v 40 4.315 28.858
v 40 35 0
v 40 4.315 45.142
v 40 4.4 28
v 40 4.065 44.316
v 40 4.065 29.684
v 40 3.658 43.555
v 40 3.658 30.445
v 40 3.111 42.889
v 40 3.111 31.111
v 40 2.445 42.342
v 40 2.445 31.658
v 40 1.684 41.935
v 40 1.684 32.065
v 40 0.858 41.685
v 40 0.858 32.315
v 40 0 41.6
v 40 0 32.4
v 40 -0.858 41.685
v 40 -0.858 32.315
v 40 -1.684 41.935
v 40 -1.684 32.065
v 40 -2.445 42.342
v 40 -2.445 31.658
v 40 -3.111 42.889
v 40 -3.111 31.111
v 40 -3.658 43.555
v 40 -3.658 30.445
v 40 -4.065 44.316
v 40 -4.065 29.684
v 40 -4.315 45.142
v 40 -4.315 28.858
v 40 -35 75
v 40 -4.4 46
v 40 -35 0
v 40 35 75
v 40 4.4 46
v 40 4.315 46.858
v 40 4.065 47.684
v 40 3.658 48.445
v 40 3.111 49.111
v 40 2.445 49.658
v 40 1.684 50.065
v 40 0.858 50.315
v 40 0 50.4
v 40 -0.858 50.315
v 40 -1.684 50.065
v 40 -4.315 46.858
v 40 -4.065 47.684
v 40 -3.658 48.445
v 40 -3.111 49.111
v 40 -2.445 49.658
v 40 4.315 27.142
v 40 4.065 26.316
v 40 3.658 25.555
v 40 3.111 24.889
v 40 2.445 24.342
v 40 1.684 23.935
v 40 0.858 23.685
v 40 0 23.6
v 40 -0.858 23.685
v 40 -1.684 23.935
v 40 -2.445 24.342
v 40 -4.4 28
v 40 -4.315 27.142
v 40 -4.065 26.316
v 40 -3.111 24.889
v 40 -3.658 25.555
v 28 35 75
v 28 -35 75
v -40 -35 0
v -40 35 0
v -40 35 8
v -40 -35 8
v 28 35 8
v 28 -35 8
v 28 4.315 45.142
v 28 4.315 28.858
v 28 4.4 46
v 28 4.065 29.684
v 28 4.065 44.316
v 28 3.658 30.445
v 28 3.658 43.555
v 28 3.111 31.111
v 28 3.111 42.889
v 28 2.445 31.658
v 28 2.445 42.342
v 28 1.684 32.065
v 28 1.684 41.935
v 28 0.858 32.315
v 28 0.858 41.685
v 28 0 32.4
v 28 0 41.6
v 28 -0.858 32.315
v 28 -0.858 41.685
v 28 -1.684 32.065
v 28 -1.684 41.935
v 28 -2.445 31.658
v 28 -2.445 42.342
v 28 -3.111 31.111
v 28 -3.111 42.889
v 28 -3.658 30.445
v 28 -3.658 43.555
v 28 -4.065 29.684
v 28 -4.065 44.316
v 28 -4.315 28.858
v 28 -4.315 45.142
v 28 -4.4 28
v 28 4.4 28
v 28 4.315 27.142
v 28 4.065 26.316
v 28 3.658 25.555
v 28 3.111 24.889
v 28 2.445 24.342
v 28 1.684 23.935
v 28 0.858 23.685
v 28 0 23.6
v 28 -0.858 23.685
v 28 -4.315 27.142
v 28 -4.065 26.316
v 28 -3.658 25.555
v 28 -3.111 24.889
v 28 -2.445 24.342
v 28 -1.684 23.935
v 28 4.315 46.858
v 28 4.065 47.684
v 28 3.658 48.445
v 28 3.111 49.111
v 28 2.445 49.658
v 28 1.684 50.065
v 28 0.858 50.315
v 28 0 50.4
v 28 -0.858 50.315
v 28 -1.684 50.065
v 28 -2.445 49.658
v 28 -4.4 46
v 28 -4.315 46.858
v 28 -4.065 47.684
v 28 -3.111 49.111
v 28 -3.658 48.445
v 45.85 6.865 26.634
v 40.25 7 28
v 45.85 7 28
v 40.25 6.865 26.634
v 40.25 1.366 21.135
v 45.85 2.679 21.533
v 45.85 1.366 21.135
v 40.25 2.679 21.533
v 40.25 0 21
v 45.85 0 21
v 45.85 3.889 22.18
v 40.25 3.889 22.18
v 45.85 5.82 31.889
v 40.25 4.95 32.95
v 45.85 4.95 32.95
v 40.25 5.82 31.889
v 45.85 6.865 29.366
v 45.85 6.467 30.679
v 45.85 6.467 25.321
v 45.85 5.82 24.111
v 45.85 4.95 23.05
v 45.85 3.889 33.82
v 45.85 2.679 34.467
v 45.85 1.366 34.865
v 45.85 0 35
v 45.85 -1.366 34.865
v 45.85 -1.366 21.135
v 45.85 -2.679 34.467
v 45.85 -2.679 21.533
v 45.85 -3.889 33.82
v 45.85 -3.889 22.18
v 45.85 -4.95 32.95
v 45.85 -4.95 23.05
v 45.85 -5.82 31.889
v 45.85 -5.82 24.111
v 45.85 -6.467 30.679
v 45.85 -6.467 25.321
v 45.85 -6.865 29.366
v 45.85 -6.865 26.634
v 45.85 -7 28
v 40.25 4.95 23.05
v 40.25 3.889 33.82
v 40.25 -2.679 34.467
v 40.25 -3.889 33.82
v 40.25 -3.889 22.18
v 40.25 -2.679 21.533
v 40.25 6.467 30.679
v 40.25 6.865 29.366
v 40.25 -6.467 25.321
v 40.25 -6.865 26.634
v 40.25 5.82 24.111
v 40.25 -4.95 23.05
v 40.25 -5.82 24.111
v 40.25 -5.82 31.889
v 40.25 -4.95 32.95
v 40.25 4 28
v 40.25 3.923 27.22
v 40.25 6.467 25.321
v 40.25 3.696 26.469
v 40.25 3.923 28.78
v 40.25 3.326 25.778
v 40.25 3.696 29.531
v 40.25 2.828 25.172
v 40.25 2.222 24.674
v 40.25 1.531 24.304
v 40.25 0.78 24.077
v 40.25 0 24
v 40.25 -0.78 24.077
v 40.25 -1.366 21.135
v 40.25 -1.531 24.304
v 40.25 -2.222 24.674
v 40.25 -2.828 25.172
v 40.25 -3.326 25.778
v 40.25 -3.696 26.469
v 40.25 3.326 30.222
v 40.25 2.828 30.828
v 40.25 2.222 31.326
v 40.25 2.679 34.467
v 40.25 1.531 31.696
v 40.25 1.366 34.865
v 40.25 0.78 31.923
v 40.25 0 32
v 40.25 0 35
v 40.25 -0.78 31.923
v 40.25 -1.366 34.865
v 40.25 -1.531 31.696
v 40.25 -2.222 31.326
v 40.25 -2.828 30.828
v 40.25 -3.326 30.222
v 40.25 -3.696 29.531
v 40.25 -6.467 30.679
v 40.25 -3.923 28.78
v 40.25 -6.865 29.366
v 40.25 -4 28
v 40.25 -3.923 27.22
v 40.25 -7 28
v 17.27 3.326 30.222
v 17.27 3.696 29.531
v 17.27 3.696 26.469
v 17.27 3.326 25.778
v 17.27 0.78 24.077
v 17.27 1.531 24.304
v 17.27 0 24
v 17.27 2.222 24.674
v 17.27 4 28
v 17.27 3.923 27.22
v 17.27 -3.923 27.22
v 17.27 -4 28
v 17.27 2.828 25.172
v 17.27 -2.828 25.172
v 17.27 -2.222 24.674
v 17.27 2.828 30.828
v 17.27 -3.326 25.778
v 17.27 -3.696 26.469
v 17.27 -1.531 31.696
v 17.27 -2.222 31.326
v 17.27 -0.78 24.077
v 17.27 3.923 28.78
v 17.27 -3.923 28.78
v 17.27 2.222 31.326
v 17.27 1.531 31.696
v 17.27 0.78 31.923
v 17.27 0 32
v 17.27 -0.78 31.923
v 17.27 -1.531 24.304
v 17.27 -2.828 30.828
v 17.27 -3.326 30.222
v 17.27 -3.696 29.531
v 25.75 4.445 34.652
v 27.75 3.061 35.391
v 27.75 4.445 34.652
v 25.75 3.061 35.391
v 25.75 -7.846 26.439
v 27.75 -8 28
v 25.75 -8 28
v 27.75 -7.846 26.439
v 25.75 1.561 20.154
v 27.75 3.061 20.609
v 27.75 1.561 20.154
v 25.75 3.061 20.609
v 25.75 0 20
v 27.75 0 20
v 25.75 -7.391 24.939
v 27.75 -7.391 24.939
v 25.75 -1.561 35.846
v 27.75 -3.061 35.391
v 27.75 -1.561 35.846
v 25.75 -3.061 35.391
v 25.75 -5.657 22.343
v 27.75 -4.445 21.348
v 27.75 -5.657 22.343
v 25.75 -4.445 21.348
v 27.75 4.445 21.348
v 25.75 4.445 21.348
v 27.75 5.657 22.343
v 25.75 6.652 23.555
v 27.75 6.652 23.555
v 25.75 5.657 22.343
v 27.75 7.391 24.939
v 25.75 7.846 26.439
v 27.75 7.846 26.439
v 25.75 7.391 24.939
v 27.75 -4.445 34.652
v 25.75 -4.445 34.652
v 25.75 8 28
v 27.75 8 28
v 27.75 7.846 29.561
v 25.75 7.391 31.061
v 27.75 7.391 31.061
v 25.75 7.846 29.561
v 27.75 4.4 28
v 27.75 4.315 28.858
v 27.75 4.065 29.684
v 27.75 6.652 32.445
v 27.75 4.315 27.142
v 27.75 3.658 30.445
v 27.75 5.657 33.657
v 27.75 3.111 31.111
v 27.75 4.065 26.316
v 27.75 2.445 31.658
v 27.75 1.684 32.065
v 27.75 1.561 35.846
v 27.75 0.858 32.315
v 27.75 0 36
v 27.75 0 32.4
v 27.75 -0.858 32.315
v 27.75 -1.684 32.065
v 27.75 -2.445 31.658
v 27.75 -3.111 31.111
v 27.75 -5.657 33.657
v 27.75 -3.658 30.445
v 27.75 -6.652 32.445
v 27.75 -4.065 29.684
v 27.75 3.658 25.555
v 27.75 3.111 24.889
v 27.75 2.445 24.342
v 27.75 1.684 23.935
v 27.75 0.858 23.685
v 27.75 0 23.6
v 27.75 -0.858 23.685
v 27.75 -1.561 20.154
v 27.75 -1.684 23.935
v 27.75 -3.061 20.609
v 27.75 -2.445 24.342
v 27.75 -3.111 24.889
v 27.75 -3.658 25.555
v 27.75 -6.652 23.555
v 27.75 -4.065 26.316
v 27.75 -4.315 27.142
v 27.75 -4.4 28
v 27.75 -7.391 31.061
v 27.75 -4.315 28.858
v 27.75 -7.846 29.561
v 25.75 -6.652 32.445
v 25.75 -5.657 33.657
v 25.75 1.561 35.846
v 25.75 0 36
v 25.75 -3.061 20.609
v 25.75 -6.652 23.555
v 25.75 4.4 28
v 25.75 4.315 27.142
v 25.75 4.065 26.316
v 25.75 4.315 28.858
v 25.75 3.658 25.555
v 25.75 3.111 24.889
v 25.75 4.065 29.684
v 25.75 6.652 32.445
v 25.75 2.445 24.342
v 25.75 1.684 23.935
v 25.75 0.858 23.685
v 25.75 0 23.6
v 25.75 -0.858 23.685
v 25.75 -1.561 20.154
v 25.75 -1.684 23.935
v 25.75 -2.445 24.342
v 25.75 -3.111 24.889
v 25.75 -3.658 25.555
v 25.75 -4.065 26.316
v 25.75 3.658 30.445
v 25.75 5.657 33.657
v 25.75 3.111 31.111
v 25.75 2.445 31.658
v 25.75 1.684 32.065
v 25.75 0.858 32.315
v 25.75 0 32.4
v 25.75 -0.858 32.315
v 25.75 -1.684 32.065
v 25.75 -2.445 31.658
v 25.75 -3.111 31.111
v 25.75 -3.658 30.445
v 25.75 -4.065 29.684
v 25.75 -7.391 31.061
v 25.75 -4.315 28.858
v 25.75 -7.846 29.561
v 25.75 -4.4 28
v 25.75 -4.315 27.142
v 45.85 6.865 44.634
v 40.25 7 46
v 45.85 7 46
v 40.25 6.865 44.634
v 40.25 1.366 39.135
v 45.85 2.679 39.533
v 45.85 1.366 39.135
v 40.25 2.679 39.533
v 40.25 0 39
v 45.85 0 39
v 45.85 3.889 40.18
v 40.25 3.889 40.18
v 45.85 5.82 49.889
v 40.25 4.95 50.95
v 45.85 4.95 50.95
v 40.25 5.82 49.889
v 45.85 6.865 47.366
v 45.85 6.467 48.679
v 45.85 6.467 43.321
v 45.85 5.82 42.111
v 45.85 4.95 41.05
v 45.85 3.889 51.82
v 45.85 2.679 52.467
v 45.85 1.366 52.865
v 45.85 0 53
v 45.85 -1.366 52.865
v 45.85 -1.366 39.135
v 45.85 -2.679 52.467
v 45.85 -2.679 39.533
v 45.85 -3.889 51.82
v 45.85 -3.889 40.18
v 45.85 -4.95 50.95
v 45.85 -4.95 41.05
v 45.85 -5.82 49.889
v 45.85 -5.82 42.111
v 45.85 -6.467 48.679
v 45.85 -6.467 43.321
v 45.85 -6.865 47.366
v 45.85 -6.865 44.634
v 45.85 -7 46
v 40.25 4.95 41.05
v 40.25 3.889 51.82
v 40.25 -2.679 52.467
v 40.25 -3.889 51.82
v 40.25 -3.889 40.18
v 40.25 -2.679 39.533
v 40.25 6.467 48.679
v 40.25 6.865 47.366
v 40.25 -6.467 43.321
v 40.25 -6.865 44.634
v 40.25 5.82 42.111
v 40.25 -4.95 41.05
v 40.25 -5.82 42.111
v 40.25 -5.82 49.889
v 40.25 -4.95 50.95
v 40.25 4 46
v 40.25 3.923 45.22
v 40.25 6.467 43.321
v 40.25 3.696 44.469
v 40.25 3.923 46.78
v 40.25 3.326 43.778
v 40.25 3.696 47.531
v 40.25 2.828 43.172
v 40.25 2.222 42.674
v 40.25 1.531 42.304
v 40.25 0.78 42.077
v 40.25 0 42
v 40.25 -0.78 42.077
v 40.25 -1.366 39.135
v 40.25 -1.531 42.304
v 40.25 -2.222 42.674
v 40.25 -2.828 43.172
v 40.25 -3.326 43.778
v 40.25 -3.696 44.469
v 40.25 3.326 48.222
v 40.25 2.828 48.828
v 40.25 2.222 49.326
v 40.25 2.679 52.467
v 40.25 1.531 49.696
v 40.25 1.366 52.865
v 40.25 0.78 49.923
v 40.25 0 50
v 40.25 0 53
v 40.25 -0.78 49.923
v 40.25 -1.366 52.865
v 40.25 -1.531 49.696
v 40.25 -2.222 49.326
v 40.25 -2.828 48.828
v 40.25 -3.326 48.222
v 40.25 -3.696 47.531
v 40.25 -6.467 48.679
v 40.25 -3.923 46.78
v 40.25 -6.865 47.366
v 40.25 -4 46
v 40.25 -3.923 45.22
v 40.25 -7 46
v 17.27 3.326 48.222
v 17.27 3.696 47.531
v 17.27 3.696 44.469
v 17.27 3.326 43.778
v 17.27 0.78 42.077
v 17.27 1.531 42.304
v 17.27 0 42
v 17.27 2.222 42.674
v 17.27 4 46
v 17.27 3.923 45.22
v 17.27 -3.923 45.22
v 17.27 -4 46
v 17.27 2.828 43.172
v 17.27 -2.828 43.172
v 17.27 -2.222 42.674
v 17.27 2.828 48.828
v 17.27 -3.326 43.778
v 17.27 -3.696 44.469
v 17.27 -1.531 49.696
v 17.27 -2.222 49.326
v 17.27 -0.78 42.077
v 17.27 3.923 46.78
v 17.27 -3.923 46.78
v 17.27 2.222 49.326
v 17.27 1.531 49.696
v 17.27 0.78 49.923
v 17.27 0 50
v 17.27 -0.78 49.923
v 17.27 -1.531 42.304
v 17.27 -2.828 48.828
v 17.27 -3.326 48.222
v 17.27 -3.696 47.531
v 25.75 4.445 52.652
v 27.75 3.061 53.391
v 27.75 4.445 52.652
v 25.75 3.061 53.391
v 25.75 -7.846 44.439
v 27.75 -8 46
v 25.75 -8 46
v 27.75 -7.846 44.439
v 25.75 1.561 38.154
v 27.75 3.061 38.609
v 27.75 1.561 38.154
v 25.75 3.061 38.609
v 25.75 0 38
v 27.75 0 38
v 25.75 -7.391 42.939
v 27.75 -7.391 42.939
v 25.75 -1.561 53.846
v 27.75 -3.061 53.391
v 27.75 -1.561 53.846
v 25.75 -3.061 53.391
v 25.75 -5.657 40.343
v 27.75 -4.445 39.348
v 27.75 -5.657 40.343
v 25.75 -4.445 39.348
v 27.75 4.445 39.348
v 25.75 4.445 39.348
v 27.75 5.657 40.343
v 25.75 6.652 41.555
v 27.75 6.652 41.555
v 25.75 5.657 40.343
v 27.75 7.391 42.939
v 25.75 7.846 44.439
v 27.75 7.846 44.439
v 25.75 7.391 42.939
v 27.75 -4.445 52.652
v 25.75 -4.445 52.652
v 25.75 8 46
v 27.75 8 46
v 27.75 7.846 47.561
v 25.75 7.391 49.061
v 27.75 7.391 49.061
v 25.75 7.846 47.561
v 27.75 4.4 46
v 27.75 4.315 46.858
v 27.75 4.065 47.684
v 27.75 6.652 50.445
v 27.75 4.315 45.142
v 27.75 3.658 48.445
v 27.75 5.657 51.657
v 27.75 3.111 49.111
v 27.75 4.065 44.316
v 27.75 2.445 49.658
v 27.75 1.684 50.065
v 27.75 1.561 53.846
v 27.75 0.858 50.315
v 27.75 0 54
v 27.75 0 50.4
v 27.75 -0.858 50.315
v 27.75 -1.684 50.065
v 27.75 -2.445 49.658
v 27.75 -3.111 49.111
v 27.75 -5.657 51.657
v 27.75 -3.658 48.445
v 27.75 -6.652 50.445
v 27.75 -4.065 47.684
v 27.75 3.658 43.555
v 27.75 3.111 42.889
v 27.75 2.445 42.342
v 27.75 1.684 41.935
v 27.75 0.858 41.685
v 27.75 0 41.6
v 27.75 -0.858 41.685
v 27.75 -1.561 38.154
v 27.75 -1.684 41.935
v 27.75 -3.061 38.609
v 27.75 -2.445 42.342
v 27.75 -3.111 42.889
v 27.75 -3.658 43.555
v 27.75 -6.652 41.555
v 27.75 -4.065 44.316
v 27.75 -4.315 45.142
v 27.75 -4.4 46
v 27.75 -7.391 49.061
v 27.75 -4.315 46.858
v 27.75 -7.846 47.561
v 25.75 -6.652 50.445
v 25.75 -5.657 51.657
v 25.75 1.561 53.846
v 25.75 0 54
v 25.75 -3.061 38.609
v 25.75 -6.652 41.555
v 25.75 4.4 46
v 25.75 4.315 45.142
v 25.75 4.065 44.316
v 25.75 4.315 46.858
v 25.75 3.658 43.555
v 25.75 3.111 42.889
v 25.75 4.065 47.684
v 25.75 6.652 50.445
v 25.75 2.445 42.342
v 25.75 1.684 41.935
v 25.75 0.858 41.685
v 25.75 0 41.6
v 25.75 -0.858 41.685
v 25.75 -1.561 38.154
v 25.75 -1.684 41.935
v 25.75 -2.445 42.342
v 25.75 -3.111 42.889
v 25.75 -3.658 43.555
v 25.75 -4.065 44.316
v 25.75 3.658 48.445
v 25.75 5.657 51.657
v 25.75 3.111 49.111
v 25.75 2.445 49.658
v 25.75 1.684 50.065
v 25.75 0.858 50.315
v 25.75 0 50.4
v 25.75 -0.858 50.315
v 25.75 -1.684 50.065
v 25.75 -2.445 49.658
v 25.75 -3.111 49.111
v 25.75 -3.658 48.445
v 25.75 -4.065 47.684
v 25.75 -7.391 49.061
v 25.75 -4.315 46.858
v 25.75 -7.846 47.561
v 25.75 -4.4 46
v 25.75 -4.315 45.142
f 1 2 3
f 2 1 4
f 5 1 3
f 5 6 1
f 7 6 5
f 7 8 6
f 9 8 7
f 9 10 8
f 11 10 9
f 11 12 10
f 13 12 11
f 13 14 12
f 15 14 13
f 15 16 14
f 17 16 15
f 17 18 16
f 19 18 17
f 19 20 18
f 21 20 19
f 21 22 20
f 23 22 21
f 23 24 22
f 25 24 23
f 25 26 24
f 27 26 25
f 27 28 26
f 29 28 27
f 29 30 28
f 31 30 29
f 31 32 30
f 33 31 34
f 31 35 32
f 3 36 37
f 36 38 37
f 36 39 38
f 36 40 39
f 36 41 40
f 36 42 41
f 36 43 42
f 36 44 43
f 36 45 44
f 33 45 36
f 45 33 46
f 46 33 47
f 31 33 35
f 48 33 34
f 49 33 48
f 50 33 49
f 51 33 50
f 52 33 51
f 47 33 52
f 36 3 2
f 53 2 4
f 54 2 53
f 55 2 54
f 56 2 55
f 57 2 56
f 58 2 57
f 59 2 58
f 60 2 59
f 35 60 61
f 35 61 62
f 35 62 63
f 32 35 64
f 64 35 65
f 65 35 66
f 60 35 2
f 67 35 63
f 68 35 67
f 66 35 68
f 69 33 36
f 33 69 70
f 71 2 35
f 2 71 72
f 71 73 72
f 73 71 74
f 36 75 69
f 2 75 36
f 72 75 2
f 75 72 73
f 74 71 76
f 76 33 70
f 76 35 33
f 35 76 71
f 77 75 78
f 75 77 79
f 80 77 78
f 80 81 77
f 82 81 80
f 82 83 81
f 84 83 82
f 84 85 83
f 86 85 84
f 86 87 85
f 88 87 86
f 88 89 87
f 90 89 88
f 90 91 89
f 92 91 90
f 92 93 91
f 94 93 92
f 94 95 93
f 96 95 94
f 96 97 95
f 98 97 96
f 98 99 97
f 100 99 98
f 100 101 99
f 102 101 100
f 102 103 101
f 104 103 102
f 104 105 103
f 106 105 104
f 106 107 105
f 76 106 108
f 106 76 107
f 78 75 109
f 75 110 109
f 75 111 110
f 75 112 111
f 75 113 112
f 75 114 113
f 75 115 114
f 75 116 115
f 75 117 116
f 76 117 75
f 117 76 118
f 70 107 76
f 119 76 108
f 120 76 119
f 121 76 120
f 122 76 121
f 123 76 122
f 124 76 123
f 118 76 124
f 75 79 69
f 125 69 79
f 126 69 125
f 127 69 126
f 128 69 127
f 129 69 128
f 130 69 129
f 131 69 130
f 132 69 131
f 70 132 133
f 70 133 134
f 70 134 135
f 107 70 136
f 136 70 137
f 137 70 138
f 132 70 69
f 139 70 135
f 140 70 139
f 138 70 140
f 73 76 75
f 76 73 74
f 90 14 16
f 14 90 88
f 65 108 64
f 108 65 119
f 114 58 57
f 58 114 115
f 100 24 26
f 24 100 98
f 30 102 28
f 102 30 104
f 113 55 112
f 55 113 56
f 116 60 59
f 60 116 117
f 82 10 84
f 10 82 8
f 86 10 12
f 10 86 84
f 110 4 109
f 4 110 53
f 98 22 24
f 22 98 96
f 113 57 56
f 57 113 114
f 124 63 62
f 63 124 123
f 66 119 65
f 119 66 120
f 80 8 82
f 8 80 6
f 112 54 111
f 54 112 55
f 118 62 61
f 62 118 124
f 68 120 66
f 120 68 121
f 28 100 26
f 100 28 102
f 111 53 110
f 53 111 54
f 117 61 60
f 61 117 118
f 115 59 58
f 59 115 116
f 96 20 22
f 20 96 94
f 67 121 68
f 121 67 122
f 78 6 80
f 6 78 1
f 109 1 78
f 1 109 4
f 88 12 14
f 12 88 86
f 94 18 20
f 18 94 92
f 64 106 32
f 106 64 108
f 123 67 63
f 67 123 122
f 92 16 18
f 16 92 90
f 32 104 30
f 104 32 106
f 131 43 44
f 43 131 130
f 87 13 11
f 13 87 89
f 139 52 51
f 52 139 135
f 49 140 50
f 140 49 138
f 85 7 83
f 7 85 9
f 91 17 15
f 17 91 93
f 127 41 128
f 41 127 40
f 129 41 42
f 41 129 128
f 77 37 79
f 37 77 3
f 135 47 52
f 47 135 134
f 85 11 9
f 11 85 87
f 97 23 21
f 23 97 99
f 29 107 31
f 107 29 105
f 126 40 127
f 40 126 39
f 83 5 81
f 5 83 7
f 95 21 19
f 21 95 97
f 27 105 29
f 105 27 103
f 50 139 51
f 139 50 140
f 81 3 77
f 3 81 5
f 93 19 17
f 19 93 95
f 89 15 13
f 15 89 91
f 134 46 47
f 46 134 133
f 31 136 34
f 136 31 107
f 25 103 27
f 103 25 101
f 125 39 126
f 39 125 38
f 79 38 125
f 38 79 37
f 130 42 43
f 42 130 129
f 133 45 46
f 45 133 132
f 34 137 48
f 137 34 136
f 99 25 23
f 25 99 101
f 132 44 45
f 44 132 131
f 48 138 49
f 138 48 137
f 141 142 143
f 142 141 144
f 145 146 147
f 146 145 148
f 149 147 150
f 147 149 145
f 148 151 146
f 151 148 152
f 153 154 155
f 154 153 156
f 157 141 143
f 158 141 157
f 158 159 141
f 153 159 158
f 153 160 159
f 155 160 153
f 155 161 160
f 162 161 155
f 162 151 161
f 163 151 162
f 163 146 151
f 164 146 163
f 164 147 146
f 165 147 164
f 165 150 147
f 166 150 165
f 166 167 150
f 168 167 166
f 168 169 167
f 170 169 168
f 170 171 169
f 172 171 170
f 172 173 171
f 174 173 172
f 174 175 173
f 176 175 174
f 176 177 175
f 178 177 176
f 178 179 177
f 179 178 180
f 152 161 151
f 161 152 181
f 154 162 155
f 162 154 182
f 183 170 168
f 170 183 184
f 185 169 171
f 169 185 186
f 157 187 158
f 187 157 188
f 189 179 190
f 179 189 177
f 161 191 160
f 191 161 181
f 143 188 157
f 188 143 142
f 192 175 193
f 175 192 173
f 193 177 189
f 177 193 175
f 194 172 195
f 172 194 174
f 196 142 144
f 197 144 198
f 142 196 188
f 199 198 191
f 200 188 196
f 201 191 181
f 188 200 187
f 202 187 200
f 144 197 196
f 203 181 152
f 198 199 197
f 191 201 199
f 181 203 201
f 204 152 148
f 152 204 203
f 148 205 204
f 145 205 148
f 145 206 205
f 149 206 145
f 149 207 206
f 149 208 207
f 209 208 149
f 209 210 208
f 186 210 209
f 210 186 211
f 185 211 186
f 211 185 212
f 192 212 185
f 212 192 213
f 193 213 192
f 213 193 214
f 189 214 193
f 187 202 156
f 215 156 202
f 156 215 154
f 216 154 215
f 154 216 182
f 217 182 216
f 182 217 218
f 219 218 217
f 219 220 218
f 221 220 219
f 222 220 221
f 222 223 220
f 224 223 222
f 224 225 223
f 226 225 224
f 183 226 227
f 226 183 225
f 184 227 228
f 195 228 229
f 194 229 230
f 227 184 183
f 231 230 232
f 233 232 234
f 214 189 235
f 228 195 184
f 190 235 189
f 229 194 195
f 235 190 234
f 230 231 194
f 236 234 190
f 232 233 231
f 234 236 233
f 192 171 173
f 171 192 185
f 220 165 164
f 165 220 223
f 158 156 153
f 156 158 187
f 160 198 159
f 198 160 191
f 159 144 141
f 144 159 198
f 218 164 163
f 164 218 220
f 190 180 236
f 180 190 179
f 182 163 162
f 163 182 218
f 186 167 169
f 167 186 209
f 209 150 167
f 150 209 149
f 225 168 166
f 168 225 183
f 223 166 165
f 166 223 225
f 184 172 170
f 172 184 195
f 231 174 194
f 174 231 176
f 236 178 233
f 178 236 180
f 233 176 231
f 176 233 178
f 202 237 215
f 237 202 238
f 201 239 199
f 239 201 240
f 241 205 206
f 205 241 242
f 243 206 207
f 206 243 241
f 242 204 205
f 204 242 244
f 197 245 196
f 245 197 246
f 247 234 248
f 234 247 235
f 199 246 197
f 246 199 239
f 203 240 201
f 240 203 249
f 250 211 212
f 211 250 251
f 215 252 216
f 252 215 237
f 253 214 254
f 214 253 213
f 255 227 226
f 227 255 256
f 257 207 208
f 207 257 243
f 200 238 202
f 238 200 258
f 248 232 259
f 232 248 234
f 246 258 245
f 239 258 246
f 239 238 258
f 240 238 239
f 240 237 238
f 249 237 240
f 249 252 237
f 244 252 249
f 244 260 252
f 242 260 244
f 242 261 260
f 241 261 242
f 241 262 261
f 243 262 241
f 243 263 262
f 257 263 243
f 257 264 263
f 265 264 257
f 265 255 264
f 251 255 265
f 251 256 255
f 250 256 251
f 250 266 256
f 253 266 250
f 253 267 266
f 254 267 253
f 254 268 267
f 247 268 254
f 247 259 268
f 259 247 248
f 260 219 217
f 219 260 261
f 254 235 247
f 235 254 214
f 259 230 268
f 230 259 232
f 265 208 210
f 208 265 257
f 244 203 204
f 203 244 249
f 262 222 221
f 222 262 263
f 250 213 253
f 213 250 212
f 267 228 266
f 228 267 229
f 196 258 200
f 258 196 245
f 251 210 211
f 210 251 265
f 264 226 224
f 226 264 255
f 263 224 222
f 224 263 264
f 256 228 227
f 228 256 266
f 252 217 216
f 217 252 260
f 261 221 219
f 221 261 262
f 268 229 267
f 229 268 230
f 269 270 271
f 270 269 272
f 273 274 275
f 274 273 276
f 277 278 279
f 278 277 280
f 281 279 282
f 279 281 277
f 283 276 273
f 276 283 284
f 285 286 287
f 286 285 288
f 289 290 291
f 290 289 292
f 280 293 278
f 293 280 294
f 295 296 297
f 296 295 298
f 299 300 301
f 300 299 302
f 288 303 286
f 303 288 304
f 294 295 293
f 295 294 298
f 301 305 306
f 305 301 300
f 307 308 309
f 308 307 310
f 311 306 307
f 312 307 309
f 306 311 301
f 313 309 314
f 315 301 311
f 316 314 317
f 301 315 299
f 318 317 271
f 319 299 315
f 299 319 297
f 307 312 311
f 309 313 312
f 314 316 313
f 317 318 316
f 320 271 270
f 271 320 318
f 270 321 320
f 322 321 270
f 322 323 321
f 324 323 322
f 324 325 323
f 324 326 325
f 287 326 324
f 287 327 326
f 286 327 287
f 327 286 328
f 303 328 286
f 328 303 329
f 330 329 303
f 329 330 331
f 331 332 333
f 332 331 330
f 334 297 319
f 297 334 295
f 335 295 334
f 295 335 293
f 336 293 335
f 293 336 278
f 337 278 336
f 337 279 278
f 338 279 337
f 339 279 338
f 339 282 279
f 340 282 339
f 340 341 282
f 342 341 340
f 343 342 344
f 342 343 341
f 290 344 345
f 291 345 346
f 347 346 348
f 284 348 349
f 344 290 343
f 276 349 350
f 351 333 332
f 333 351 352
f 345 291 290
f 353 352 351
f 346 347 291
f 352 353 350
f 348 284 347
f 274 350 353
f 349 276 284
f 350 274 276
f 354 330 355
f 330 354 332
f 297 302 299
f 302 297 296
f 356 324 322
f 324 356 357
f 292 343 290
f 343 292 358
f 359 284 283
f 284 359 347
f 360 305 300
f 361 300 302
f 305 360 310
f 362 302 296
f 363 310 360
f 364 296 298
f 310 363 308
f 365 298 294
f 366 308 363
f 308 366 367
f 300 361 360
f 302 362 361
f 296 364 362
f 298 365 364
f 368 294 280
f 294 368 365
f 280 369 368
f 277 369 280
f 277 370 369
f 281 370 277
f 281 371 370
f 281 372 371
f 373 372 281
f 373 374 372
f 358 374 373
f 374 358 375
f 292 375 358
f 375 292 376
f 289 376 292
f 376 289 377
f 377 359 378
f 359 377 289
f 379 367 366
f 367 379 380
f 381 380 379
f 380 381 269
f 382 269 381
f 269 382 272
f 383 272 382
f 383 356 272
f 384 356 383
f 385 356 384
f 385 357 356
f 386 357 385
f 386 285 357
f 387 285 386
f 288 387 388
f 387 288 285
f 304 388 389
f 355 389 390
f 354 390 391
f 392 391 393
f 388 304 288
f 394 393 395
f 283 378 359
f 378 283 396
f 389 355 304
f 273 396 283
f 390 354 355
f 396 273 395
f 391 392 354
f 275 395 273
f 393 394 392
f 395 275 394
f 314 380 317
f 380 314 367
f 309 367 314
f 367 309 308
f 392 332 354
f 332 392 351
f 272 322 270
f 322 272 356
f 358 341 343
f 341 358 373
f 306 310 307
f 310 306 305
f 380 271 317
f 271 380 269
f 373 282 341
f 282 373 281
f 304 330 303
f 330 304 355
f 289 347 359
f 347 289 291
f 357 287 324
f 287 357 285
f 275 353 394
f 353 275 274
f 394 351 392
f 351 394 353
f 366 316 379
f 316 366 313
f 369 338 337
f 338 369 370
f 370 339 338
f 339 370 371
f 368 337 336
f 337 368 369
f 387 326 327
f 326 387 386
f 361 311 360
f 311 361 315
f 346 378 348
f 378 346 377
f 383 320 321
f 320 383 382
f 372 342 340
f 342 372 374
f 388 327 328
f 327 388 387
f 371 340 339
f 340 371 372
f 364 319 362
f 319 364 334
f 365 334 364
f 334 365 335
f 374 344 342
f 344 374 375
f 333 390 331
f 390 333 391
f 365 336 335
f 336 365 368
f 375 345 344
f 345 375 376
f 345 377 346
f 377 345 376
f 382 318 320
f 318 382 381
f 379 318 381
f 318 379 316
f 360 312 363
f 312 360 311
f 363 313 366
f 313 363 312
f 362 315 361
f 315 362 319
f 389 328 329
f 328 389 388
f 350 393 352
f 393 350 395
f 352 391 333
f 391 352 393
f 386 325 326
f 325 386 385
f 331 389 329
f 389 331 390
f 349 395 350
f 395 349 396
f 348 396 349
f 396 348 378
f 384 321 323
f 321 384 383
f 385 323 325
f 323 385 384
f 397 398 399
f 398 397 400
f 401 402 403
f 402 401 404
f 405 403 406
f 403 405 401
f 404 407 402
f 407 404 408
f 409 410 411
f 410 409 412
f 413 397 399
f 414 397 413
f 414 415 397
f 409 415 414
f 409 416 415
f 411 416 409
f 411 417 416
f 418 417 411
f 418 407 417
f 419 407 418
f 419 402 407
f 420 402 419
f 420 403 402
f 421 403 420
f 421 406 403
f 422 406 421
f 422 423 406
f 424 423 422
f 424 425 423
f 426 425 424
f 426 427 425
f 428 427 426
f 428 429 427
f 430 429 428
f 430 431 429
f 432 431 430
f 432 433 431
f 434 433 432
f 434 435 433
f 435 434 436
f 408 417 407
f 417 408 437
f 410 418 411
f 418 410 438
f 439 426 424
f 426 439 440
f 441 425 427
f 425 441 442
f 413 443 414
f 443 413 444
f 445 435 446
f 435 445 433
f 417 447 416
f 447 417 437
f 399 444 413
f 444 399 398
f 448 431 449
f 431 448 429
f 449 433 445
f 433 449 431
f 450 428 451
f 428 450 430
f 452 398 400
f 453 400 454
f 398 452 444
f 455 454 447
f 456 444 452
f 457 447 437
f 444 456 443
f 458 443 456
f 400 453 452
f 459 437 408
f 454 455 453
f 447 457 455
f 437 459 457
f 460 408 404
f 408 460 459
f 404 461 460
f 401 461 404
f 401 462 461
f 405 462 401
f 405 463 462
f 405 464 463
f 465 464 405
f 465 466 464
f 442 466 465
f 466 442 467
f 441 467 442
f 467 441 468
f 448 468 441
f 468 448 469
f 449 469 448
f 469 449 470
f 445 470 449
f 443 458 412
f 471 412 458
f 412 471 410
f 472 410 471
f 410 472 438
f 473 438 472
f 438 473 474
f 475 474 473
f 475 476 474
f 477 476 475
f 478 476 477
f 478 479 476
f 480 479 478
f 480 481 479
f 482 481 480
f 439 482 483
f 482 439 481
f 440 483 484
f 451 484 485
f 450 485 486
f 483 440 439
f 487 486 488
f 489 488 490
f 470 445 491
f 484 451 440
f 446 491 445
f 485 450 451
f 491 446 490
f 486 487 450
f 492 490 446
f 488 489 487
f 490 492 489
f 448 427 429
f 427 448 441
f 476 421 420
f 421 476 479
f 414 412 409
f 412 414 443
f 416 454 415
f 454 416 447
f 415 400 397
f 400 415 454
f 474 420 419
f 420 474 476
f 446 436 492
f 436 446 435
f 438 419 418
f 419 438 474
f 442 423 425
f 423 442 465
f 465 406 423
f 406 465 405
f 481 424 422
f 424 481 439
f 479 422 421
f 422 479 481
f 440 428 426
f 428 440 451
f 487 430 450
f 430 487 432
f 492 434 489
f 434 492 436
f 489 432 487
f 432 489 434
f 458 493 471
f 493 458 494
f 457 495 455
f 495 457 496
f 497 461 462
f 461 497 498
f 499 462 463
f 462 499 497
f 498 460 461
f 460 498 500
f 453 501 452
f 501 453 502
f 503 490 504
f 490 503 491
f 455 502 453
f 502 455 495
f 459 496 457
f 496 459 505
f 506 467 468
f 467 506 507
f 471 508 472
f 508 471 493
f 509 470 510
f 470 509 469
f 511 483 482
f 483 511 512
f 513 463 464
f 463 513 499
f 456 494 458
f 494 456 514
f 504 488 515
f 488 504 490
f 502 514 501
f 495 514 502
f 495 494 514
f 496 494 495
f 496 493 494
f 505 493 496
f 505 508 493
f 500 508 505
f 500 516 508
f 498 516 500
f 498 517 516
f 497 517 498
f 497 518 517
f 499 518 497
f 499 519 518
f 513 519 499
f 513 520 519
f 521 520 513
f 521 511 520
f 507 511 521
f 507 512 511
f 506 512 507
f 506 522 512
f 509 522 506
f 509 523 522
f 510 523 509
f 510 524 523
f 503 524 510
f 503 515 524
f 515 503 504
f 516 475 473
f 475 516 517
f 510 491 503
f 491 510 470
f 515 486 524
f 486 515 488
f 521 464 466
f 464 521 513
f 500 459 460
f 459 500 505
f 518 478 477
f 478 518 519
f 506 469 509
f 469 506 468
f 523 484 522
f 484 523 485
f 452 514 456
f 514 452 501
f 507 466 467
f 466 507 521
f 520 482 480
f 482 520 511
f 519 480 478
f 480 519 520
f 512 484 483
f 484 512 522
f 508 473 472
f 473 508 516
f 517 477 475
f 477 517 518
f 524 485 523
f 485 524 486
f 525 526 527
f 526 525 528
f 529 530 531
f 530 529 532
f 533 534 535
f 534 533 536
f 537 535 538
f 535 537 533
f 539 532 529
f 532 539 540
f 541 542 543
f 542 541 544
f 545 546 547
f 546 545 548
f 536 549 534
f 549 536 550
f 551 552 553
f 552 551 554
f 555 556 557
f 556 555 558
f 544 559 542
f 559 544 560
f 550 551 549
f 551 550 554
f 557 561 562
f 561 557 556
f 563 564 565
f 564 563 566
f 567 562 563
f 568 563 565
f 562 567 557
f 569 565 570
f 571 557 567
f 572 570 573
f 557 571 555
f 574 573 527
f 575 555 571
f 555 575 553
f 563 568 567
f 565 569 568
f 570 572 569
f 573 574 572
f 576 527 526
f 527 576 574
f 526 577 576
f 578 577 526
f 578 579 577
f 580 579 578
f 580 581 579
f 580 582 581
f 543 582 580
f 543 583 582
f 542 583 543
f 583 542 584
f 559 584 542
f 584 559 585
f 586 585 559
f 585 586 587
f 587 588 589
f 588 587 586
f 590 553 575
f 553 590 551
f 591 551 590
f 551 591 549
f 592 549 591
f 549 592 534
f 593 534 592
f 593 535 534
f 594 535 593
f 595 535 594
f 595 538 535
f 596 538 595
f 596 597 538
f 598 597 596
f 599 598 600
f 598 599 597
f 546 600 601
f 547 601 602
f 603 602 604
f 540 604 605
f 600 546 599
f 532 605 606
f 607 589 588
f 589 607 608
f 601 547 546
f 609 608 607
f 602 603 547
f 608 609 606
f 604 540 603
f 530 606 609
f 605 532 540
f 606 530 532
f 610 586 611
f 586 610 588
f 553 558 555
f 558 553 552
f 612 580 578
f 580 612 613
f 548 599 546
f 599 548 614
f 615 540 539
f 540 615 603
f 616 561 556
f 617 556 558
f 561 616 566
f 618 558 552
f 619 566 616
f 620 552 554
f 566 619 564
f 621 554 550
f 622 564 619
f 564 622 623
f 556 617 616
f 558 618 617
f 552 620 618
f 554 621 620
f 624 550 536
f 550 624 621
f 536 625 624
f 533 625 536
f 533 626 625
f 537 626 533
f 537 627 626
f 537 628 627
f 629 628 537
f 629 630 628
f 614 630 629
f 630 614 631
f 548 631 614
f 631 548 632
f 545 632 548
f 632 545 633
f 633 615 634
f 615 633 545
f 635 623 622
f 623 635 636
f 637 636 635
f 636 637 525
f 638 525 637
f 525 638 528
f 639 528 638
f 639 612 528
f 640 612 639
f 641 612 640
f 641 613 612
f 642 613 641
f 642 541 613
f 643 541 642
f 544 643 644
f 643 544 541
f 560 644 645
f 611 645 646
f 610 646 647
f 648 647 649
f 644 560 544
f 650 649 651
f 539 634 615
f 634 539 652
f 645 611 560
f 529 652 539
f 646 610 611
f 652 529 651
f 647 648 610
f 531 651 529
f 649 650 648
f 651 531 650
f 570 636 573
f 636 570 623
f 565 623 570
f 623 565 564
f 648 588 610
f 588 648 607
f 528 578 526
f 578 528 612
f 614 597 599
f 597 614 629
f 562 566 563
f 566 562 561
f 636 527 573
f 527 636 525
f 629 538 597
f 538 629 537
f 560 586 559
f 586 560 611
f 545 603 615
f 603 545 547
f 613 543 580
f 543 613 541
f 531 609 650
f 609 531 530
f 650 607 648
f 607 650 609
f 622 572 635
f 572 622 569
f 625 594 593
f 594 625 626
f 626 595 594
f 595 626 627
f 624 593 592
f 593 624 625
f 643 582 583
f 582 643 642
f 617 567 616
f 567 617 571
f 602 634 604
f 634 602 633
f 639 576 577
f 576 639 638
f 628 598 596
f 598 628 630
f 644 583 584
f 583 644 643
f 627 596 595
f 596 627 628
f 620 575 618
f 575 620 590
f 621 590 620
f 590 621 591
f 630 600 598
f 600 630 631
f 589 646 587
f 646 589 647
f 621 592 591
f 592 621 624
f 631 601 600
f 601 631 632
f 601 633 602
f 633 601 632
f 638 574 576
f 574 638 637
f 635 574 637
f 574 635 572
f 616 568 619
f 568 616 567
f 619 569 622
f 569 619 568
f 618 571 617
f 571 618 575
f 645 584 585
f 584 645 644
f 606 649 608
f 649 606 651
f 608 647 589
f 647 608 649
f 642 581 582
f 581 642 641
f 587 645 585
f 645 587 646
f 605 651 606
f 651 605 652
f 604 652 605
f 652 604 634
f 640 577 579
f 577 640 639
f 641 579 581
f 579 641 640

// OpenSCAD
$fn = 32;

// ------------------------------------------------------------------------
// Bolted bracket: 80 x 70 mm bracket with 2 bolt joints
// Every part is its own module, assembly() places them once.
// ------------------------------------------------------------------------

// --- part 1 ---
module bracket() {
  difference() {
    translate([-40, -35, 0]) cube([80, 70, 75]);
    translate([-41, -36, 8]) cube([69, 72, 68]);
    translate([34, 0, 28]) rotate([0, 90, 0]) cylinder(h = 14, d = 8.8, center = true);
    translate([34, 0, 46]) rotate([0, 90, 0]) cylinder(h = 14, d = 8.8, center = true);
  }
}

// --- part 2 ---
module bolt1() {
  cylinder(h = 5.6, d = 14);
  translate([0, 0, -22.98]) cylinder(h = 22.98, d = 8);
}

// --- part 3 ---
module washer1() {
  difference() {
      translate([0, 0, 0]) cylinder(h = 2, d = 16);
      translate([0, 0, -1]) cylinder(h = 4, d = 8.8);
    }
}

// --- part 4 ---
module bolt2() {
  cylinder(h = 5.6, d = 14);
  translate([0, 0, -22.98]) cylinder(h = 22.98, d = 8);
}

// --- part 5 ---
module washer2() {
  difference() {
      translate([0, 0, 0]) cylinder(h = 2, d = 16);
      translate([0, 0, -1]) cylinder(h = 4, d = 8.8);
    }
}

// --- assembly ---
module assembly() {
  translate([0, 0, 0]) rotate([0, 0, 0]) bracket();
  translate([40.25, 0, 28]) rotate([0, 90, 0]) bolt1();
  translate([25.75, 0, 28]) rotate([0, 90, 0]) washer1();
  translate([40.25, 0, 46]) rotate([0, 90, 0]) bolt2();
  translate([25.75, 0, 46]) rotate([0, 90, 0]) washer2();
}

assembly();
